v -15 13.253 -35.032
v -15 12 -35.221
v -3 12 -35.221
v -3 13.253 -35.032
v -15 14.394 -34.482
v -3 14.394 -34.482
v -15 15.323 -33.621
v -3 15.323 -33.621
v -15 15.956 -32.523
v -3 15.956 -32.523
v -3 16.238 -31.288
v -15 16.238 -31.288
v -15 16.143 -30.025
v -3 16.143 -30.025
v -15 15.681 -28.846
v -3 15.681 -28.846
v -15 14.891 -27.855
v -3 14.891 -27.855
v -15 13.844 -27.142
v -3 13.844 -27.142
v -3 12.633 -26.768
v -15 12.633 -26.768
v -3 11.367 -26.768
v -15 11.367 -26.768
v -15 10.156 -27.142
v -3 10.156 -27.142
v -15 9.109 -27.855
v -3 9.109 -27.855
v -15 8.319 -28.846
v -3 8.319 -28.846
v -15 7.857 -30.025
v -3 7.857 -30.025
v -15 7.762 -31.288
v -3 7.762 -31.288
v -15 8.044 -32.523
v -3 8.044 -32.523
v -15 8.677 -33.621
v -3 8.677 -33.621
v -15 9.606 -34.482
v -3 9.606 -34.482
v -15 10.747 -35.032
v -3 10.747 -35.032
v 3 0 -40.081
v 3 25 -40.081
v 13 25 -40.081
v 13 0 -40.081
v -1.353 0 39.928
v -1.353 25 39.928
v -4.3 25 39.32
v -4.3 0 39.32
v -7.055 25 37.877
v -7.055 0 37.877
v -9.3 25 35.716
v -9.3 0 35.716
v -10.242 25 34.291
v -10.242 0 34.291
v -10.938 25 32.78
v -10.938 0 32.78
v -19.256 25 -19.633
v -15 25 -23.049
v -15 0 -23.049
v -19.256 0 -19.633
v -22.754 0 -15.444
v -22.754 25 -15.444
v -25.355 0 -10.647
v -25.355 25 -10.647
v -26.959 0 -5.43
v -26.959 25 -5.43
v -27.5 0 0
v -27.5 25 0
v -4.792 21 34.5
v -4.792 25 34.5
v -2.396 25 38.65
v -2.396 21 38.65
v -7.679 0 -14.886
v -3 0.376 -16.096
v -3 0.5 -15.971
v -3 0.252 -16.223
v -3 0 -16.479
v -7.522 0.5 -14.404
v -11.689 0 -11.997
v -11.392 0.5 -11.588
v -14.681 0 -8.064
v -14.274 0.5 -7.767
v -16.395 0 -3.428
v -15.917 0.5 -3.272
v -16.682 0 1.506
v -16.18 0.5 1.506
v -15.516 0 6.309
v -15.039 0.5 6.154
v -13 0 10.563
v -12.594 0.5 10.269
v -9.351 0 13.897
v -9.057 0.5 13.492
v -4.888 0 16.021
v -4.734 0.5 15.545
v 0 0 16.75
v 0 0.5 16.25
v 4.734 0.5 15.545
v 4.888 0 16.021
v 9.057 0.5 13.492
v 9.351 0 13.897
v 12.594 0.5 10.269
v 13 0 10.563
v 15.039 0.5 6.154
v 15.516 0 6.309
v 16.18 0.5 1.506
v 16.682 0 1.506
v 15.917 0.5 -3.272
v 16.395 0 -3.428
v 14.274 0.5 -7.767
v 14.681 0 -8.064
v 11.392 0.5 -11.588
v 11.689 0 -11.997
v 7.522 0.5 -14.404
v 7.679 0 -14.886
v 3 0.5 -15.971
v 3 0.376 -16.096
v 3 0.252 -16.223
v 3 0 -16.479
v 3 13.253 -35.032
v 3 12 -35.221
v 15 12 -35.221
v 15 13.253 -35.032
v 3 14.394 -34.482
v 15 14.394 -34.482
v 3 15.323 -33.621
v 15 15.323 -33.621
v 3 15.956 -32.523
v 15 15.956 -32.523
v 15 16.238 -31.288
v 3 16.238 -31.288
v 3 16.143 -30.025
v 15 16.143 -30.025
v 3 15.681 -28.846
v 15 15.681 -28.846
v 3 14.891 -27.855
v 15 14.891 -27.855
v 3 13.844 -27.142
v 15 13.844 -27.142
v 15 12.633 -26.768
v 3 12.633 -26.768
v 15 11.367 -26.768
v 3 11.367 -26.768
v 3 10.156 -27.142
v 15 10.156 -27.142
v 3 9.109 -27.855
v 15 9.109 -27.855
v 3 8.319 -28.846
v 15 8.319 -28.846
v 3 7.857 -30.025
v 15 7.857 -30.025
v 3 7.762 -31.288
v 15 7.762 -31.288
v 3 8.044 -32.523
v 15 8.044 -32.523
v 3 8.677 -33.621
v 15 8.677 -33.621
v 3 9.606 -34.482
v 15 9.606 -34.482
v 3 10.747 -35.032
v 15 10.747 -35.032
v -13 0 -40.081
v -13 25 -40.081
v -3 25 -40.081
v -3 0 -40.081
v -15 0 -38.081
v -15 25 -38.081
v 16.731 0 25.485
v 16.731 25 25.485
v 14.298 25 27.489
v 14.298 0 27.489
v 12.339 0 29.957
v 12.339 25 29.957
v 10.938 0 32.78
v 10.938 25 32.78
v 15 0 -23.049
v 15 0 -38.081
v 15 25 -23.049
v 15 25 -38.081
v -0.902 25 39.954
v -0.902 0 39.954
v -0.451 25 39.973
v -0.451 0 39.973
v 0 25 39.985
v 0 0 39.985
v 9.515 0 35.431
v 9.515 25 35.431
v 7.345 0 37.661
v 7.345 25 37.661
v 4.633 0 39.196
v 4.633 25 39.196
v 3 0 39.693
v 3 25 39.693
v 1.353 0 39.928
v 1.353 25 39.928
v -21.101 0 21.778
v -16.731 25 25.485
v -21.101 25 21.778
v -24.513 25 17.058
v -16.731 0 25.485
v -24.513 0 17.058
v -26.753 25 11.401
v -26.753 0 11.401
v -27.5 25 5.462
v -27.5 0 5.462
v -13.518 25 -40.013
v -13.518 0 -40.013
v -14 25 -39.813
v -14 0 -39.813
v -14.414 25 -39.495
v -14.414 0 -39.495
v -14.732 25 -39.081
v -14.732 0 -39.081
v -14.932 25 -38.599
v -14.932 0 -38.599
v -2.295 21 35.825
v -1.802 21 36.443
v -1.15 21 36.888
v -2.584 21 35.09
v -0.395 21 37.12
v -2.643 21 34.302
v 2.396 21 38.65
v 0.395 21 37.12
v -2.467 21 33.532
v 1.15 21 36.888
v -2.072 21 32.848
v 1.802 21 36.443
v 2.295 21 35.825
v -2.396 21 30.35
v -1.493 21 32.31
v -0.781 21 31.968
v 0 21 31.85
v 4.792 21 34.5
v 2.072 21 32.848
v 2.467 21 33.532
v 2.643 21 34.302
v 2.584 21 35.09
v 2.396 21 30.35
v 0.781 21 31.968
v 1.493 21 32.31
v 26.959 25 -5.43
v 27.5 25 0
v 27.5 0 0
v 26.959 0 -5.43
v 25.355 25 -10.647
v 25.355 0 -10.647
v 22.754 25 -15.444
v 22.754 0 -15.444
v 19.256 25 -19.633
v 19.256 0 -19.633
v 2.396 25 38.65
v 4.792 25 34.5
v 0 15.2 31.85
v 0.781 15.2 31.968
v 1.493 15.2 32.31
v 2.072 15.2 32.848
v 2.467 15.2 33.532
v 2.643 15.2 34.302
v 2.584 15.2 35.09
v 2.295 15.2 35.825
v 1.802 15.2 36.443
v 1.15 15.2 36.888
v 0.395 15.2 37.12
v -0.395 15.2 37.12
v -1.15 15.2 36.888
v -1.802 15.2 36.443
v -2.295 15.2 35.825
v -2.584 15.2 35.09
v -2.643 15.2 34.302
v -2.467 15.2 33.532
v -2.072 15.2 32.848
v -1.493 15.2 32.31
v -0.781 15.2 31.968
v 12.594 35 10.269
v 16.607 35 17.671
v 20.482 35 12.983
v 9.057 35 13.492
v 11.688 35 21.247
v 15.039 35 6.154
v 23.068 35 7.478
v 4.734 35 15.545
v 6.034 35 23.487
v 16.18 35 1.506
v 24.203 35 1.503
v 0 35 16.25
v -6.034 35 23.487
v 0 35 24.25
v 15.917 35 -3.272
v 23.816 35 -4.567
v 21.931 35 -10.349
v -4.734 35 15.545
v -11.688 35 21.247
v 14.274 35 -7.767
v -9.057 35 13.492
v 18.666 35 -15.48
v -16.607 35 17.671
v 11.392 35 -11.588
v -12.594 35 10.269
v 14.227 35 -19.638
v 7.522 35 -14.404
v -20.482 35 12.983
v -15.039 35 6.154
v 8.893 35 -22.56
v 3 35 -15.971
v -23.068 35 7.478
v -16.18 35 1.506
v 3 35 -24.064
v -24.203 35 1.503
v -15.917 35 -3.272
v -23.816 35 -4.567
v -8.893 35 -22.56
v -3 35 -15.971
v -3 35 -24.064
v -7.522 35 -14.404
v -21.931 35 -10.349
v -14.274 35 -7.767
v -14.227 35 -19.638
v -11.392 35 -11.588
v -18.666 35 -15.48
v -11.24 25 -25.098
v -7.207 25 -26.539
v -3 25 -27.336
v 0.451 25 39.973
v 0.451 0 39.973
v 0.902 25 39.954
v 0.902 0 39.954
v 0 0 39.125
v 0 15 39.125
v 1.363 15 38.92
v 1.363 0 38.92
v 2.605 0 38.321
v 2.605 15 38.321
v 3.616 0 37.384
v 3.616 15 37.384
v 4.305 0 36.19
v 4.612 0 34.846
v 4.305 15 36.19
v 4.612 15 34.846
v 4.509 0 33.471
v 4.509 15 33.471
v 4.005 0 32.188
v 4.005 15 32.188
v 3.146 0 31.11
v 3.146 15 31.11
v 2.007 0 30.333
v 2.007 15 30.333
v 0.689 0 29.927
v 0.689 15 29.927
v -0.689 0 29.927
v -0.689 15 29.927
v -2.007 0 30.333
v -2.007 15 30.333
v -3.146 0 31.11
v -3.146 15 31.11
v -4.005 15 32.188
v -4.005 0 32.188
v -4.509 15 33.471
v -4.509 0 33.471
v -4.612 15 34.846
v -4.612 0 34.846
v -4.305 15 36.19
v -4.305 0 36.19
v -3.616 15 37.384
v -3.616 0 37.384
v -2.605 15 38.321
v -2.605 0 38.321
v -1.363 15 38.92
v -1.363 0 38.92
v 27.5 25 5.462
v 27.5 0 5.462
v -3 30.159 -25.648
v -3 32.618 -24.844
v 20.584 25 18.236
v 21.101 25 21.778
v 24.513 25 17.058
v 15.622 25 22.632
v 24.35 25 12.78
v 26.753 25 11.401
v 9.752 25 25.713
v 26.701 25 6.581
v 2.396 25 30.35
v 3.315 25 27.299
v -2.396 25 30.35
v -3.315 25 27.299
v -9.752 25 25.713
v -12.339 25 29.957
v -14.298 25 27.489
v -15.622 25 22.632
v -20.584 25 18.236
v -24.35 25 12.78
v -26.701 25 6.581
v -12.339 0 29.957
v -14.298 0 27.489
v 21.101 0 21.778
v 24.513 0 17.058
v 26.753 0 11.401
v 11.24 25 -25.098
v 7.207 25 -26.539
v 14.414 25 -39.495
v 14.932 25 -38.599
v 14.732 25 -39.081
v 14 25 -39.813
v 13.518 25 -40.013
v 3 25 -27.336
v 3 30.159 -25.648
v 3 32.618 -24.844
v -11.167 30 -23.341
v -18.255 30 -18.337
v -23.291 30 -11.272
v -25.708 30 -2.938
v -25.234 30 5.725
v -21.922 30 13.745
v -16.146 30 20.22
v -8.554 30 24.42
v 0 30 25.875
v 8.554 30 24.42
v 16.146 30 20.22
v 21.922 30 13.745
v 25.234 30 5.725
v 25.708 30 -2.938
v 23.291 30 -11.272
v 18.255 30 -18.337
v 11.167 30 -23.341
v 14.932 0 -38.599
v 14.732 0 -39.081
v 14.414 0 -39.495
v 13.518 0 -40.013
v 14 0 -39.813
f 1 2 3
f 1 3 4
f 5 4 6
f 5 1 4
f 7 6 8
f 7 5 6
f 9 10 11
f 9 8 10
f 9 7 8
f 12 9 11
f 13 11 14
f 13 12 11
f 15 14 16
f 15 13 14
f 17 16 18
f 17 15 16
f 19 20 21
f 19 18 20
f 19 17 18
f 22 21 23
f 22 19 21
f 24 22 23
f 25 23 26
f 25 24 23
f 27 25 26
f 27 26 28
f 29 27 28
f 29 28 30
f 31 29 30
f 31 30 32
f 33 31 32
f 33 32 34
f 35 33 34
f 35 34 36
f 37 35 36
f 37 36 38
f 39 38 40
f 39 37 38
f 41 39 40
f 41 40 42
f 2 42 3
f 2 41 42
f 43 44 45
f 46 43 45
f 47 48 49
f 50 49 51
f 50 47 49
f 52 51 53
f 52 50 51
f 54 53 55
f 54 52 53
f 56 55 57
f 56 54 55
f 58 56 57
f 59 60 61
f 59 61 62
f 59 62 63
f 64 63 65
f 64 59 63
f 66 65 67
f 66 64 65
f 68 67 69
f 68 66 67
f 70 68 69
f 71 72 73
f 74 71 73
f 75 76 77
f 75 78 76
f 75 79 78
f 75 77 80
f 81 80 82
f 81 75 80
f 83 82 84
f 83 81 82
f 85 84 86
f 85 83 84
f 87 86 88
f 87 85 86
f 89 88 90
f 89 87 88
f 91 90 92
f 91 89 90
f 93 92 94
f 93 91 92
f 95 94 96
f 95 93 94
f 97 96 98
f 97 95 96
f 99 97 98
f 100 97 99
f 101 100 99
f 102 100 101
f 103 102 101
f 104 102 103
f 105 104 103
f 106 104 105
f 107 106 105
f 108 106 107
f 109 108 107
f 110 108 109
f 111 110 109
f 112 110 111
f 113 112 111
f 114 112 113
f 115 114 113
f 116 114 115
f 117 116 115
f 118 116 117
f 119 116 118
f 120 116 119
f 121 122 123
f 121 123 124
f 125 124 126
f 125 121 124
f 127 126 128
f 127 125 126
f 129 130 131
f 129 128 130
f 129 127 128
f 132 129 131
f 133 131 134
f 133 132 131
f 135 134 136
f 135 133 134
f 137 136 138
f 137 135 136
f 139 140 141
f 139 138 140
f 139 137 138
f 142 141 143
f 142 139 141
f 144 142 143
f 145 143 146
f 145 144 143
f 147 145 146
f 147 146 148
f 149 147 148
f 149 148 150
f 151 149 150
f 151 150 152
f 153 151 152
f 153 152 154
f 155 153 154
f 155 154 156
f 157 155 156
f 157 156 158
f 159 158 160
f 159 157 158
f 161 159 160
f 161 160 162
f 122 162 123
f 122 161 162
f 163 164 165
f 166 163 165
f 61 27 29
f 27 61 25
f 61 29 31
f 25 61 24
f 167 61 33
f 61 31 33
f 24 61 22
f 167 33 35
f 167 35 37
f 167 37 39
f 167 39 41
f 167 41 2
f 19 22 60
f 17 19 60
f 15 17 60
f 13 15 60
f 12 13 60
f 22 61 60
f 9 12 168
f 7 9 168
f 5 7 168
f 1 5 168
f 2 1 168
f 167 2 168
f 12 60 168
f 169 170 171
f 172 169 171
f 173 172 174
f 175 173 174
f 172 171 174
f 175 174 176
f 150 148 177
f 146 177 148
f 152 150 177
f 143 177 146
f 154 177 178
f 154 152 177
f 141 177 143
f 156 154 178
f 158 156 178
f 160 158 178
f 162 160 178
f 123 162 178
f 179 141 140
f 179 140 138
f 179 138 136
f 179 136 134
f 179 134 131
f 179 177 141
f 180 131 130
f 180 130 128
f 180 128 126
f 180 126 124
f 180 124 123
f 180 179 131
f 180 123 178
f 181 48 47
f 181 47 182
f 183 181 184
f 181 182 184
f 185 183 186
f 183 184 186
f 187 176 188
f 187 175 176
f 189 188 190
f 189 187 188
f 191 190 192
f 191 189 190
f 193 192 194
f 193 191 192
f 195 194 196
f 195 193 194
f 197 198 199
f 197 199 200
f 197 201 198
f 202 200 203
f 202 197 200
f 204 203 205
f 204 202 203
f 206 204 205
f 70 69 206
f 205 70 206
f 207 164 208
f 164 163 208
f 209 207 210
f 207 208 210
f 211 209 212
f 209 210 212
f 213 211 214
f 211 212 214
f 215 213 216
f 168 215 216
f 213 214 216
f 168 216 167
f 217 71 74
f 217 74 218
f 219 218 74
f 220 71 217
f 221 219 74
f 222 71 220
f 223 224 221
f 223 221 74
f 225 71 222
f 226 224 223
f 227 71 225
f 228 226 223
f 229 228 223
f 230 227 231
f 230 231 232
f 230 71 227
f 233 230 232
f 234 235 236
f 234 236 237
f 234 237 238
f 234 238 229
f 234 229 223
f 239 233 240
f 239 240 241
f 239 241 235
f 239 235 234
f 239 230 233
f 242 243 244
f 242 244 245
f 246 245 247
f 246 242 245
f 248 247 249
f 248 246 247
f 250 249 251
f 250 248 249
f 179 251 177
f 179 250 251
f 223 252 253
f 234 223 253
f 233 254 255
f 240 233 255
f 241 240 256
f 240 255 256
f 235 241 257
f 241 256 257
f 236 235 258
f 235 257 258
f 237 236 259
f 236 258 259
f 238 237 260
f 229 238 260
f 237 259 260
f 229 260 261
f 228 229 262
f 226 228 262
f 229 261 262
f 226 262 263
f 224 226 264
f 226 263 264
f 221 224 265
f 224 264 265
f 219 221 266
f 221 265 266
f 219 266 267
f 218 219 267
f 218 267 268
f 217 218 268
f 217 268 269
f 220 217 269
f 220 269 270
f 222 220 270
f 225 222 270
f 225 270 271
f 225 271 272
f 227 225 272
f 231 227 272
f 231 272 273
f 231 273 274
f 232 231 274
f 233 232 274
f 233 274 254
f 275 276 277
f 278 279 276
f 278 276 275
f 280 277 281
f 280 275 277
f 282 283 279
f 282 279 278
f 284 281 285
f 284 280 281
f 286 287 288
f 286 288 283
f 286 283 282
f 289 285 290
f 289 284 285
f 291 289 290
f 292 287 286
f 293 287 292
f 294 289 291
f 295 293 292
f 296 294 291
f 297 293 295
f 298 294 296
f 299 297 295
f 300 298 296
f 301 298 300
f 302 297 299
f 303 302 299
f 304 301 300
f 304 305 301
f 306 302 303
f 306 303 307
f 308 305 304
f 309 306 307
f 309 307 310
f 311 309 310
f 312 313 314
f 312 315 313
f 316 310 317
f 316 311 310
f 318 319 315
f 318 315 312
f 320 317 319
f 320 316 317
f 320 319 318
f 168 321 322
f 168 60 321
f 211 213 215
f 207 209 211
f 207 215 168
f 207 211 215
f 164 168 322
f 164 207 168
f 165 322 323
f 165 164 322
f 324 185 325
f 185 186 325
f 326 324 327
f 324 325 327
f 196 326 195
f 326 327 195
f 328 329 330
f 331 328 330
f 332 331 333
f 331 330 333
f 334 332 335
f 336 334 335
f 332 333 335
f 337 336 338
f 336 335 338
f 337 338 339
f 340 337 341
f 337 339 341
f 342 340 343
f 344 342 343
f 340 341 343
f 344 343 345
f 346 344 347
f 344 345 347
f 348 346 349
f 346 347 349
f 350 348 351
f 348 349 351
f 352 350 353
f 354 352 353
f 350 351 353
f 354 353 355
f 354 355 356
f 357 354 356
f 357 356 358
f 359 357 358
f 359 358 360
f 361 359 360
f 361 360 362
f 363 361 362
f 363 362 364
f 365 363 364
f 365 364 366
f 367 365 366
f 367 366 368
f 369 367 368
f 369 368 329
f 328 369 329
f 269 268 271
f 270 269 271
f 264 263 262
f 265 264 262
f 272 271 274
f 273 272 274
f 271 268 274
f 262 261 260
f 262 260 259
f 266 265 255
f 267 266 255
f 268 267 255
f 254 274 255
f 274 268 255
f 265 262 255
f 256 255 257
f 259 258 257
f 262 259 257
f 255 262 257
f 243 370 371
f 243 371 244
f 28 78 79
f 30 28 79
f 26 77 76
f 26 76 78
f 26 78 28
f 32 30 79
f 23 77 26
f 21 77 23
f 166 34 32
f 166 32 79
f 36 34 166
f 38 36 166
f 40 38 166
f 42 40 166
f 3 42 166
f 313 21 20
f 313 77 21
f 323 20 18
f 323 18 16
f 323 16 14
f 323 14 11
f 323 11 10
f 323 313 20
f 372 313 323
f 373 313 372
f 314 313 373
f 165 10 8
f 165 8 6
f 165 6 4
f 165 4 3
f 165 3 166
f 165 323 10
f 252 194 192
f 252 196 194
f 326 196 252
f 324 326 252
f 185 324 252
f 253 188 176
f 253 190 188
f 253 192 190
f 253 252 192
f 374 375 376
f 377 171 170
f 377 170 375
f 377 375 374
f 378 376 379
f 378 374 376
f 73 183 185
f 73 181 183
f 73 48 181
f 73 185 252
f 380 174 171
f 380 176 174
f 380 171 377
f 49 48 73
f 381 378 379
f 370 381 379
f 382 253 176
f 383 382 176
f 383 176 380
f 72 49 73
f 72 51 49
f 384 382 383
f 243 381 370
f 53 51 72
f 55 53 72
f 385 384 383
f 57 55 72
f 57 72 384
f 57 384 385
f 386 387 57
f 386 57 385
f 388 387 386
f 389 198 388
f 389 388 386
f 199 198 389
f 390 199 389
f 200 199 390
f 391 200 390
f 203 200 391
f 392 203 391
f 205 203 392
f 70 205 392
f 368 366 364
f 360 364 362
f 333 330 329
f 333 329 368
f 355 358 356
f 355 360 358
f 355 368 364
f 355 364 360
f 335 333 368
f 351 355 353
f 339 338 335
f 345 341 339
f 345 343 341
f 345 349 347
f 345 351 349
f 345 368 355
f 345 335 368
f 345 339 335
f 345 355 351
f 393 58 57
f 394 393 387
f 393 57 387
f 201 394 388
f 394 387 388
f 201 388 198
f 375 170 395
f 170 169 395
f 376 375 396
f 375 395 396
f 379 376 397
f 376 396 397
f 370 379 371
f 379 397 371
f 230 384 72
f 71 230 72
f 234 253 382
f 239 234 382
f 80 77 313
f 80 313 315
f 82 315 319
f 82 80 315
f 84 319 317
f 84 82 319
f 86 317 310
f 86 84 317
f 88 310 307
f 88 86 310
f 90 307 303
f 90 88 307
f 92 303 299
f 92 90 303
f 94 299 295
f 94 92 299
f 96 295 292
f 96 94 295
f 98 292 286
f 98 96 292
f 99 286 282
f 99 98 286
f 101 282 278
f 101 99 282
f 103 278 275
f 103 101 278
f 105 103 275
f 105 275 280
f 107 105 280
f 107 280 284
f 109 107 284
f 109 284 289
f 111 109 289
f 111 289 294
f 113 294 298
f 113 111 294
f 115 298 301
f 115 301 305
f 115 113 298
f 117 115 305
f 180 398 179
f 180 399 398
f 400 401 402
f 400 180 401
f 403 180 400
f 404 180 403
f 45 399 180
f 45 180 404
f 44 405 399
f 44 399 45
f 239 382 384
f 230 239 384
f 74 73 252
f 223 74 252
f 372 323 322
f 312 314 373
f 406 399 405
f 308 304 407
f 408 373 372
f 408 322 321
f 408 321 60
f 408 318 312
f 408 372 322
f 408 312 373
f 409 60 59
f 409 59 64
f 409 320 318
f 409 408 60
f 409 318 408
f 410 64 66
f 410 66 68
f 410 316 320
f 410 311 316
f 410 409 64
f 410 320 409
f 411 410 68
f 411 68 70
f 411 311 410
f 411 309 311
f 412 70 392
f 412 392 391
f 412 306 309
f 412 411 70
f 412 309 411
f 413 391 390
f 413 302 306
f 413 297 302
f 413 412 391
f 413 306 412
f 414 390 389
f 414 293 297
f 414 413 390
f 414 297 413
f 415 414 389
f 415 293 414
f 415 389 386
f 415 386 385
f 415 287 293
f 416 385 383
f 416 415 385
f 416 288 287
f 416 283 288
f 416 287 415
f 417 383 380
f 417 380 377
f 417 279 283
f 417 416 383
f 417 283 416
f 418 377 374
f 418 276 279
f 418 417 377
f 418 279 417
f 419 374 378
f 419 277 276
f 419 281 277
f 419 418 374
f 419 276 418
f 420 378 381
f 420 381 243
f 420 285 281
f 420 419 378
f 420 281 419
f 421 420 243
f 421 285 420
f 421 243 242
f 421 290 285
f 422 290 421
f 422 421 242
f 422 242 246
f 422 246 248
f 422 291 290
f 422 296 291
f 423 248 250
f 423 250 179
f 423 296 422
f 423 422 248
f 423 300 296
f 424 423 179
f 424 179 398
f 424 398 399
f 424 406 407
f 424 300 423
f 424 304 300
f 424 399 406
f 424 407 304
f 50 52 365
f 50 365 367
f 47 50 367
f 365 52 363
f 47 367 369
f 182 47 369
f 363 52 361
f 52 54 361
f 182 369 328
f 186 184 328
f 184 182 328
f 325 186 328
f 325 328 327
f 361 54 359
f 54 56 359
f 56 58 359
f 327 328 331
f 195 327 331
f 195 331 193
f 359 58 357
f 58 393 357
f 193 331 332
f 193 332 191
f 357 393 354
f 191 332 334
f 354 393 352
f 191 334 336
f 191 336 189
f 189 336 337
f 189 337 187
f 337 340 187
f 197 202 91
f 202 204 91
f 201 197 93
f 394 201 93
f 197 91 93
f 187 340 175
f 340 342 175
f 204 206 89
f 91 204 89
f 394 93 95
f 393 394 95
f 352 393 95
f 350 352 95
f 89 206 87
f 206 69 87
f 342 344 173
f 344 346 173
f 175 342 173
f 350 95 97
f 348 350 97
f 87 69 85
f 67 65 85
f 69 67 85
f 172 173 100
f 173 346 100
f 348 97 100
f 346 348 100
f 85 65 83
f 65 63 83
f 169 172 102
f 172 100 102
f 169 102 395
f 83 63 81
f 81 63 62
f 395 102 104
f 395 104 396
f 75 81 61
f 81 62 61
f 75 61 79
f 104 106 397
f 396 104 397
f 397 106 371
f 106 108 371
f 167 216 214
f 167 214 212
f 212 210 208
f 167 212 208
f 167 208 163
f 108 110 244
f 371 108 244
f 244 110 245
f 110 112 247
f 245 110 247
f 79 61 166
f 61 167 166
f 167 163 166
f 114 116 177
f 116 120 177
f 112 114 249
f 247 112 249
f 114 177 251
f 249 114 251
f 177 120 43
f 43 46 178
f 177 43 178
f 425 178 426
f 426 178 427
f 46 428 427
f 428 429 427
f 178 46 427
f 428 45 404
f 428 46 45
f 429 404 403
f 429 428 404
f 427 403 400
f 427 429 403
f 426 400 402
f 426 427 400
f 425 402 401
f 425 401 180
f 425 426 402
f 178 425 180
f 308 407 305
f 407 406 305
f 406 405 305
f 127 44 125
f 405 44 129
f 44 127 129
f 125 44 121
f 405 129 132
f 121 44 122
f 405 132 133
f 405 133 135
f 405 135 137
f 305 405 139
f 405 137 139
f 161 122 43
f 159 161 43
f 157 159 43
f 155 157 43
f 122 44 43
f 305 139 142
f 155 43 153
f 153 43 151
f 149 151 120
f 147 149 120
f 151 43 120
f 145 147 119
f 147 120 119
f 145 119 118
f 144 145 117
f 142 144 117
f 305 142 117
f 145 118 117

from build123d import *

# Parameters (mm, degrees)
SKETCH2_W               = 6
SKETCH2_H               = 60
CUT_EXTRUDE1_DEPTH      = 67.520673478
CUT_EXTRUDE2_DEPTH      = 69.366658541
CUT_EXTRUDE2_DEPTH_BACK = 69.366658541
SKETCH3_R               = 4.25
SKETCH6_R               = 2.65
CUT_EXTRUDE5_DEPTH      = 67.520673599
CUT_EXTRUDE6_DEPTH      = 4
CUT_EXTRUDE7_DEPTH      = 62.846584554
FILLET1_R               = 28
SKETCH12_W              = 12
SKETCH12_H              = 3
BOSS_EXTRUDE1_DEPTH     = 25
CHAMFER1_SIZE           = 0.5
FILLET2_R               = 2
SKETCH13_R              = 4.625
CUT_EXTRUDE8_DEPTH      = 53.561734699
SKETCH15_R              = 2.65
BOSS_EXTRUDE2_DEPTH     = 0.2
SKETCH16_R              = 15
CUT_EXTRUDE9_DEPTH      = 55.660186193
FILLET3_R               = 11
FILLET4_R               = 24


with BuildPart() as part:
    # Sketch1 → Revolve1 (revolve)
    with BuildSketch(Plane.XY, mode=Mode.PRIVATE) as revolve1_sk:
        Polygon((16.25, 0), (40, 0), (40, 25), (27.5, 25), (24.25, 35), (16.25, 35), align=None)
    revolve(revolve1_sk.sketch.rotate(Axis((0, 0, 0), (0, 1, 0)), 90), axis=Axis((0, 0, 0), (0, 1, 0)))

    # Sketch2 → Cut-Extrude1 (cut, through all)
    with BuildSketch(Plane.XZ):
        with Locations((0, -30)):
            Rectangle(SKETCH2_W, SKETCH2_H)
    extrude(amount=-CUT_EXTRUDE1_DEPTH, mode=Mode.SUBTRACT)

    # Sketch3 → Cut-Extrude2 (cut, two sides: drawn at the far end of the back side and taken through both)
    with BuildSketch(Plane(origin=(-3, 0, 0), x_dir=(0, 0, -1), z_dir=(1, 0, 0)).offset(-CUT_EXTRUDE2_DEPTH_BACK)):
        with Locations((30.970676254, 12)):
            Circle(SKETCH3_R)
    extrude(amount=CUT_EXTRUDE2_DEPTH + CUT_EXTRUDE2_DEPTH_BACK, mode=Mode.SUBTRACT)

    # Sketch6 → Cut-Extrude5 (cut, through all)
    with BuildSketch(Plane.XZ):
        with Locations(Location((0, 34.5, 0), (0, 0, 270))):
            Circle(SKETCH6_R)
    extrude(amount=-CUT_EXTRUDE5_DEPTH, mode=Mode.SUBTRACT)

    # Sketch7 → Cut-Extrude6 (cut)
    with BuildSketch(Plane(origin=(0, 25, 0), x_dir=(1, 0, 0), z_dir=(0, 1, 0))):
        Polygon((-2.396003617, -30.35), (-4.792007234, -34.5), (-2.396003617, -38.65), (2.396003617, -38.65), (4.792007234, -34.5), (2.396003617, -30.35), align=None)
    extrude(amount=-CUT_EXTRUDE6_DEPTH, mode=Mode.SUBTRACT)

    # Sketch8 → Cut-Extrude7 (cut, through all)
    with BuildSketch(Plane(origin=(0, 25, 0), x_dir=(1, 0, 0), z_dir=(0, 1, 0))):
        with BuildLine():
            Line((-27.5, 0), (-27.5, -50))
            Line((-27.5, -50), (-50, -50))
            Line((-50, -50), (-50, 70))
            Line((-50, 70), (50, 70))
            Line((50, 70), (50, -50))
            Line((50, -50), (27.5, -50))
            Line((27.5, -50), (27.5, 0))
            ThreePointArc((27.5, 0), (24.173849507, 13.110110602), (15, 23.048861143))
            Line((15, 23.048861143), (15, 60))
            Line((15, 60), (-15, 60))
            Line((-15, 60), (-15, 23.048861143))
            ThreePointArc((-15, 23.048861143), (-24.173849507, 13.110110602), (-27.5, 0))
        make_face()
    extrude(amount=-CUT_EXTRUDE7_DEPTH, mode=Mode.SUBTRACT)

    # Fillet1
    # the kernel refuses this fillet: 28 mm, written as the material it takes off along each edge
    with BuildSketch(Plane(origin=(27.5, -77.857831737, 29.047375097), x_dir=(-0.9365360560407987, 0, 0.3505712705507198), z_dir=(0, 1, 0))) as fillet1_piece_1:
        with BuildLine():
            CenterArc((20.243036252, -25.791236836), FILLET1_R, 67.089723989, 92.388015463)
            Line((-5.979973318, -15.975241261), (0, 0))
            ThreePointArc((0, 0), (15.571566347, 3.155375949), (31.143132695, 0))
        make_face()
    extrude(amount=180.715663474, mode=Mode.SUBTRACT)
    with BuildSketch(Plane(origin=(-27.5, -77.857831737, 29.047375097), x_dir=(0, 0, -1), z_dir=(0, 1, 0))) as fillet1_piece_2:
        with BuildLine():
            CenterArc((17.057796288, -28), FILLET1_R, 90, 92.388015463)
            ThreePointArc((-10.917887598, -29.166666667), (-8.414067145, -13.477149178), (0, 0))
            Line((0, 0), (17.057796288, 0))
        make_face()
    extrude(amount=180.715663474, mode=Mode.SUBTRACT)

    # Sketch12 → Boss-Extrude1 (add)
    with BuildSketch(Plane(origin=(0, 25, 0), x_dir=(1, 0, 0), z_dir=(0, 1, 0))):
        with Locations((-9, 38.580992435)):
            Rectangle(SKETCH12_W, SKETCH12_H)
        with Locations((9, 38.580992435)):
            Rectangle(SKETCH12_W, SKETCH12_H)
    extrude(amount=-BOSS_EXTRUDE1_DEPTH)

    # Chamfer1
    chamfer1_edges = [part.edges().sort_by_distance(p)[0] for p in [
        (0, 0, 16.25),
    ]]
    chamfer(chamfer1_edges, length=CHAMFER1_SIZE)

    # Fillet2
    fillet2_edges = [part.edges().sort_by_distance(p)[0] for p in [
        (-15, 12.5, -40.080992435),
        (15, 12.5, -40.080992435),
    ]]
    fillet(fillet2_edges, radius=FILLET2_R)

    # Sketch13 → Cut-Extrude8 (cut, through all)
    with BuildSketch(Plane(origin=(0, 15, 0), x_dir=(1, 0, 0), z_dir=(0, 1, 0))):
        with Locations(Location((0, -34.5, 0), (0, 0, 270))):
            Circle(SKETCH13_R)
    extrude(amount=-CUT_EXTRUDE8_DEPTH, mode=Mode.SUBTRACT)

    # Sketch15 → Boss-Extrude2 (add)
    with BuildSketch(Plane.XZ.offset(-15)):
        with Locations(Location((0, 34.5, 0), (0, 0, 270))):
            Circle(SKETCH15_R)
    extrude(amount=-BOSS_EXTRUDE2_DEPTH)

    # Sketch16 → Cut-Extrude9 (cut, through all)
    with BuildSketch(Plane(origin=(0, 25, 0), x_dir=(1, 0, 0), z_dir=(0, 1, 0))):
        with Locations((25, -38)):
            Circle(SKETCH16_R)
        with Locations((-25, -38)):
            Circle(SKETCH16_R)
    extrude(amount=-CUT_EXTRUDE9_DEPTH, mode=Mode.SUBTRACT)

    # Fillet3
    fillet3_edges = [part.edges().sort_by_distance(p)[0] for p in [
        (10.000096358, 12.5, 37.946234534),
        (-10.000096358, 12.5, 37.946234534),
    ]]
    fillet(fillet3_edges, radius=FILLET3_R)

    # Fillet4
    fillet4_edges = [part.edges().sort_by_distance(p)[0] for p in [
        (-25.243486575, 12.5, 23.001976321),
        (25.243486575, 12.5, 23.001976321),
    ]]
    fillet(fillet4_edges, radius=FILLET4_R)


solid = part.part
